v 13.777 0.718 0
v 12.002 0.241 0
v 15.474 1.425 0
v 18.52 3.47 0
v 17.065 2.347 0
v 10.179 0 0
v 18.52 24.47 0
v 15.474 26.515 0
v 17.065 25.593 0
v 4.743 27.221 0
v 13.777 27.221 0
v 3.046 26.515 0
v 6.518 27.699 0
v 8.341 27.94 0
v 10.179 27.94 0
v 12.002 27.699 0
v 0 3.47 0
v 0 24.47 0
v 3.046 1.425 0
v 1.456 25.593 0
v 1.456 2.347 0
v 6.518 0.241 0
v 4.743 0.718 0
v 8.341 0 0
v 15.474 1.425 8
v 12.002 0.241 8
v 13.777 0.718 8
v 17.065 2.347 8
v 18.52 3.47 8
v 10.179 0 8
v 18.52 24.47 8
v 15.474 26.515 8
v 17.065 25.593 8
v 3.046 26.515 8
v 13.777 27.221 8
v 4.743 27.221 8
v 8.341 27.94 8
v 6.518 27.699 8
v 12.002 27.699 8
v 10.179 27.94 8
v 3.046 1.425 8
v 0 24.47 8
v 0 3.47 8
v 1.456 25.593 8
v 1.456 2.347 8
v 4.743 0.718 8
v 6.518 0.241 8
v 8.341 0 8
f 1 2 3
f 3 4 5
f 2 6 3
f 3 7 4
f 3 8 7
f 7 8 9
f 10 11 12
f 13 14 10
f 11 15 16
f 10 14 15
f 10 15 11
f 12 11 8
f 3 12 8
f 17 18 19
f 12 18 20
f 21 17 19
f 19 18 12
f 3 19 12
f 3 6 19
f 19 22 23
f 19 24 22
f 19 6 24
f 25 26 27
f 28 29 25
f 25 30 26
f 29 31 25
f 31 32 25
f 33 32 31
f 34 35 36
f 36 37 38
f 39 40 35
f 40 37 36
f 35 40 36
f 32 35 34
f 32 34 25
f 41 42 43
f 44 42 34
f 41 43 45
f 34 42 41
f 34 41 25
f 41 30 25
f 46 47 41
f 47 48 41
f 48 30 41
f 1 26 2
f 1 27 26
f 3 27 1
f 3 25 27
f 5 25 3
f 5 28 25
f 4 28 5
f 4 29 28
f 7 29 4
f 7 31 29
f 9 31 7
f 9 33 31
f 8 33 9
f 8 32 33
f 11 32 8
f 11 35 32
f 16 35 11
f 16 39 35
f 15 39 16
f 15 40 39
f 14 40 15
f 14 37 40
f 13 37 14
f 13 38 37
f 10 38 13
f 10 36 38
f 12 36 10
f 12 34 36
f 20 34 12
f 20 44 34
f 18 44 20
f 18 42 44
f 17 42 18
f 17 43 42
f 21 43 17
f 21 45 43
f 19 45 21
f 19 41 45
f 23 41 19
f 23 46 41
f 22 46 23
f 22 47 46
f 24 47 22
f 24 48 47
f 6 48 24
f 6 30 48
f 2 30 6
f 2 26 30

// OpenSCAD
$fn = 32;

// ----------------------------------------------------------------------
// Eccentric disc: double_d, 8 mm thick
// ----------------------------------------------------------------------

// --- parameters (mm) ---
profile_height = 8;       // extrusion height
profile_points = 24;      // points of the closed outline

profile = [[18.52, 24.47], [17.065, 25.593], [15.474, 26.515], [13.777, 27.221], [12.002, 27.699], [10.179, 27.94], [8.341, 27.94], [6.518, 27.699], [4.743, 27.221], [3.046, 26.515], [1.456, 25.593], [0, 24.47], [0, 3.47], [1.456, 2.347], [3.046, 1.425], [4.743, 0.718], [6.518, 0.241], [8.341, 0], [10.179, 0], [12.002, 0.241], [13.777, 0.718], [15.474, 1.425], [17.065, 2.347], [18.52, 3.47]];  // single closed polygon, 24 points, counter clockwise

// --- the one profile operation ---
linear_extrude(height = profile_height) polygon(points = profile);
